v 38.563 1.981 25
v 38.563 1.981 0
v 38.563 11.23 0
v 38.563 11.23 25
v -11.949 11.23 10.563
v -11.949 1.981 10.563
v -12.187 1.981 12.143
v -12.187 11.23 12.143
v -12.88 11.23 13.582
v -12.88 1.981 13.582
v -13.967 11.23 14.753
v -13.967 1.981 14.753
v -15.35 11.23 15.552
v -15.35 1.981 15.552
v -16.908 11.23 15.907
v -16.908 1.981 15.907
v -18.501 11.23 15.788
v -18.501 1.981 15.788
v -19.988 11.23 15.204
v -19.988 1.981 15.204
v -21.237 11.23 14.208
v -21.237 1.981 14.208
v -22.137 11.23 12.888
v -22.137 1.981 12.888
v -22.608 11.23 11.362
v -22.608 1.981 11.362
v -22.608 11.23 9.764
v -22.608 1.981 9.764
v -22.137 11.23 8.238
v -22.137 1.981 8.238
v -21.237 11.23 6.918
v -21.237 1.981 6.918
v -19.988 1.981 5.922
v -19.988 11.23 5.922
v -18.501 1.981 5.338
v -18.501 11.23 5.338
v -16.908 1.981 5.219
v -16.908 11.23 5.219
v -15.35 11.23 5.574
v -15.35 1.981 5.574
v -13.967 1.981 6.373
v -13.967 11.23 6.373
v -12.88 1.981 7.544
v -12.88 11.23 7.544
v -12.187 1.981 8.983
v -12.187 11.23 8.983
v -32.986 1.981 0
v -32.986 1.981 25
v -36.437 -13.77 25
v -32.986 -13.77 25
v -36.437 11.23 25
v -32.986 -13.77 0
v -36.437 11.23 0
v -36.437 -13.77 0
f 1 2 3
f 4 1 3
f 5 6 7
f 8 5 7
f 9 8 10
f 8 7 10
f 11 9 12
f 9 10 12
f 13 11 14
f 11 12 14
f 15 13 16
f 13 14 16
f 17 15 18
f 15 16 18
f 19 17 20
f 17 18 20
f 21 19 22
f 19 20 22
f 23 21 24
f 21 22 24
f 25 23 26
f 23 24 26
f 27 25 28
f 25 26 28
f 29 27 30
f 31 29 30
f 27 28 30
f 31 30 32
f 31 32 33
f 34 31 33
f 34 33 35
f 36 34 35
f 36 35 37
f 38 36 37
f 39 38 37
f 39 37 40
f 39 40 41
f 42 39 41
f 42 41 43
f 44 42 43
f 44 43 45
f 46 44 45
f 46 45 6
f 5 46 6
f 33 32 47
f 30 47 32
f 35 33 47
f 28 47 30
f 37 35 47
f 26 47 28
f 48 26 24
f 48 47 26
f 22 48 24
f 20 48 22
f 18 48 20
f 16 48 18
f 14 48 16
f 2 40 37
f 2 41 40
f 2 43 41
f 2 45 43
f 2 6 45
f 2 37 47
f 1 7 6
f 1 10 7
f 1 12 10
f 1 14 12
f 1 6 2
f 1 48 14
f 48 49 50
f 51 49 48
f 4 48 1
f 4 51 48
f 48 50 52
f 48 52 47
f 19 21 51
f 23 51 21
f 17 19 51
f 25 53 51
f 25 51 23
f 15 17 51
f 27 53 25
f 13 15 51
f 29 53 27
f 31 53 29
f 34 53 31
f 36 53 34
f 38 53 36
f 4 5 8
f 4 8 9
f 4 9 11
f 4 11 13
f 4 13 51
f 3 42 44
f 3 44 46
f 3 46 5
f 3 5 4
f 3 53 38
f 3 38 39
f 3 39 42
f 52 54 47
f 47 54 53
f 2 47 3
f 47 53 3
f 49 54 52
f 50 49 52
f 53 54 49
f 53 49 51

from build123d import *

# Parameters (mm, degrees)
F0_W     = 75
F0_H     = 25
F1_DEPTH = 25
F2_W     = 71.5489391237
F2_H     = 15.7507188409
F3_DEPTH = 25
F4_R     = 5.3592968527
F5_DEPTH = 25


with BuildPart() as f1:
    # F0 (on Top) → F1 (new body)
    with BuildSketch(Plane.XY):
        with Locations((1.0630879551, -1.2695866427)):
            Rectangle(F0_W, F0_H)
    extrude(amount=F1_DEPTH)

    # F2 (on face) → F3 (cut)
    with BuildSketch(Plane.XY.offset(25)):
        with Locations((2.7886183932, -5.8942272223)):
            Rectangle(F2_W, F2_H)
    extrude(amount=-F3_DEPTH, mode=Mode.SUBTRACT)

    # F4 (on face) → F5 (cut)
    with BuildSketch(Plane.XZ.offset(-1.9811321981)):
        with Locations((-17.3081532121, 10.5629041791)):
            Circle(F4_R)
    extrude(amount=-F5_DEPTH, mode=Mode.SUBTRACT)


solid = f1.part
